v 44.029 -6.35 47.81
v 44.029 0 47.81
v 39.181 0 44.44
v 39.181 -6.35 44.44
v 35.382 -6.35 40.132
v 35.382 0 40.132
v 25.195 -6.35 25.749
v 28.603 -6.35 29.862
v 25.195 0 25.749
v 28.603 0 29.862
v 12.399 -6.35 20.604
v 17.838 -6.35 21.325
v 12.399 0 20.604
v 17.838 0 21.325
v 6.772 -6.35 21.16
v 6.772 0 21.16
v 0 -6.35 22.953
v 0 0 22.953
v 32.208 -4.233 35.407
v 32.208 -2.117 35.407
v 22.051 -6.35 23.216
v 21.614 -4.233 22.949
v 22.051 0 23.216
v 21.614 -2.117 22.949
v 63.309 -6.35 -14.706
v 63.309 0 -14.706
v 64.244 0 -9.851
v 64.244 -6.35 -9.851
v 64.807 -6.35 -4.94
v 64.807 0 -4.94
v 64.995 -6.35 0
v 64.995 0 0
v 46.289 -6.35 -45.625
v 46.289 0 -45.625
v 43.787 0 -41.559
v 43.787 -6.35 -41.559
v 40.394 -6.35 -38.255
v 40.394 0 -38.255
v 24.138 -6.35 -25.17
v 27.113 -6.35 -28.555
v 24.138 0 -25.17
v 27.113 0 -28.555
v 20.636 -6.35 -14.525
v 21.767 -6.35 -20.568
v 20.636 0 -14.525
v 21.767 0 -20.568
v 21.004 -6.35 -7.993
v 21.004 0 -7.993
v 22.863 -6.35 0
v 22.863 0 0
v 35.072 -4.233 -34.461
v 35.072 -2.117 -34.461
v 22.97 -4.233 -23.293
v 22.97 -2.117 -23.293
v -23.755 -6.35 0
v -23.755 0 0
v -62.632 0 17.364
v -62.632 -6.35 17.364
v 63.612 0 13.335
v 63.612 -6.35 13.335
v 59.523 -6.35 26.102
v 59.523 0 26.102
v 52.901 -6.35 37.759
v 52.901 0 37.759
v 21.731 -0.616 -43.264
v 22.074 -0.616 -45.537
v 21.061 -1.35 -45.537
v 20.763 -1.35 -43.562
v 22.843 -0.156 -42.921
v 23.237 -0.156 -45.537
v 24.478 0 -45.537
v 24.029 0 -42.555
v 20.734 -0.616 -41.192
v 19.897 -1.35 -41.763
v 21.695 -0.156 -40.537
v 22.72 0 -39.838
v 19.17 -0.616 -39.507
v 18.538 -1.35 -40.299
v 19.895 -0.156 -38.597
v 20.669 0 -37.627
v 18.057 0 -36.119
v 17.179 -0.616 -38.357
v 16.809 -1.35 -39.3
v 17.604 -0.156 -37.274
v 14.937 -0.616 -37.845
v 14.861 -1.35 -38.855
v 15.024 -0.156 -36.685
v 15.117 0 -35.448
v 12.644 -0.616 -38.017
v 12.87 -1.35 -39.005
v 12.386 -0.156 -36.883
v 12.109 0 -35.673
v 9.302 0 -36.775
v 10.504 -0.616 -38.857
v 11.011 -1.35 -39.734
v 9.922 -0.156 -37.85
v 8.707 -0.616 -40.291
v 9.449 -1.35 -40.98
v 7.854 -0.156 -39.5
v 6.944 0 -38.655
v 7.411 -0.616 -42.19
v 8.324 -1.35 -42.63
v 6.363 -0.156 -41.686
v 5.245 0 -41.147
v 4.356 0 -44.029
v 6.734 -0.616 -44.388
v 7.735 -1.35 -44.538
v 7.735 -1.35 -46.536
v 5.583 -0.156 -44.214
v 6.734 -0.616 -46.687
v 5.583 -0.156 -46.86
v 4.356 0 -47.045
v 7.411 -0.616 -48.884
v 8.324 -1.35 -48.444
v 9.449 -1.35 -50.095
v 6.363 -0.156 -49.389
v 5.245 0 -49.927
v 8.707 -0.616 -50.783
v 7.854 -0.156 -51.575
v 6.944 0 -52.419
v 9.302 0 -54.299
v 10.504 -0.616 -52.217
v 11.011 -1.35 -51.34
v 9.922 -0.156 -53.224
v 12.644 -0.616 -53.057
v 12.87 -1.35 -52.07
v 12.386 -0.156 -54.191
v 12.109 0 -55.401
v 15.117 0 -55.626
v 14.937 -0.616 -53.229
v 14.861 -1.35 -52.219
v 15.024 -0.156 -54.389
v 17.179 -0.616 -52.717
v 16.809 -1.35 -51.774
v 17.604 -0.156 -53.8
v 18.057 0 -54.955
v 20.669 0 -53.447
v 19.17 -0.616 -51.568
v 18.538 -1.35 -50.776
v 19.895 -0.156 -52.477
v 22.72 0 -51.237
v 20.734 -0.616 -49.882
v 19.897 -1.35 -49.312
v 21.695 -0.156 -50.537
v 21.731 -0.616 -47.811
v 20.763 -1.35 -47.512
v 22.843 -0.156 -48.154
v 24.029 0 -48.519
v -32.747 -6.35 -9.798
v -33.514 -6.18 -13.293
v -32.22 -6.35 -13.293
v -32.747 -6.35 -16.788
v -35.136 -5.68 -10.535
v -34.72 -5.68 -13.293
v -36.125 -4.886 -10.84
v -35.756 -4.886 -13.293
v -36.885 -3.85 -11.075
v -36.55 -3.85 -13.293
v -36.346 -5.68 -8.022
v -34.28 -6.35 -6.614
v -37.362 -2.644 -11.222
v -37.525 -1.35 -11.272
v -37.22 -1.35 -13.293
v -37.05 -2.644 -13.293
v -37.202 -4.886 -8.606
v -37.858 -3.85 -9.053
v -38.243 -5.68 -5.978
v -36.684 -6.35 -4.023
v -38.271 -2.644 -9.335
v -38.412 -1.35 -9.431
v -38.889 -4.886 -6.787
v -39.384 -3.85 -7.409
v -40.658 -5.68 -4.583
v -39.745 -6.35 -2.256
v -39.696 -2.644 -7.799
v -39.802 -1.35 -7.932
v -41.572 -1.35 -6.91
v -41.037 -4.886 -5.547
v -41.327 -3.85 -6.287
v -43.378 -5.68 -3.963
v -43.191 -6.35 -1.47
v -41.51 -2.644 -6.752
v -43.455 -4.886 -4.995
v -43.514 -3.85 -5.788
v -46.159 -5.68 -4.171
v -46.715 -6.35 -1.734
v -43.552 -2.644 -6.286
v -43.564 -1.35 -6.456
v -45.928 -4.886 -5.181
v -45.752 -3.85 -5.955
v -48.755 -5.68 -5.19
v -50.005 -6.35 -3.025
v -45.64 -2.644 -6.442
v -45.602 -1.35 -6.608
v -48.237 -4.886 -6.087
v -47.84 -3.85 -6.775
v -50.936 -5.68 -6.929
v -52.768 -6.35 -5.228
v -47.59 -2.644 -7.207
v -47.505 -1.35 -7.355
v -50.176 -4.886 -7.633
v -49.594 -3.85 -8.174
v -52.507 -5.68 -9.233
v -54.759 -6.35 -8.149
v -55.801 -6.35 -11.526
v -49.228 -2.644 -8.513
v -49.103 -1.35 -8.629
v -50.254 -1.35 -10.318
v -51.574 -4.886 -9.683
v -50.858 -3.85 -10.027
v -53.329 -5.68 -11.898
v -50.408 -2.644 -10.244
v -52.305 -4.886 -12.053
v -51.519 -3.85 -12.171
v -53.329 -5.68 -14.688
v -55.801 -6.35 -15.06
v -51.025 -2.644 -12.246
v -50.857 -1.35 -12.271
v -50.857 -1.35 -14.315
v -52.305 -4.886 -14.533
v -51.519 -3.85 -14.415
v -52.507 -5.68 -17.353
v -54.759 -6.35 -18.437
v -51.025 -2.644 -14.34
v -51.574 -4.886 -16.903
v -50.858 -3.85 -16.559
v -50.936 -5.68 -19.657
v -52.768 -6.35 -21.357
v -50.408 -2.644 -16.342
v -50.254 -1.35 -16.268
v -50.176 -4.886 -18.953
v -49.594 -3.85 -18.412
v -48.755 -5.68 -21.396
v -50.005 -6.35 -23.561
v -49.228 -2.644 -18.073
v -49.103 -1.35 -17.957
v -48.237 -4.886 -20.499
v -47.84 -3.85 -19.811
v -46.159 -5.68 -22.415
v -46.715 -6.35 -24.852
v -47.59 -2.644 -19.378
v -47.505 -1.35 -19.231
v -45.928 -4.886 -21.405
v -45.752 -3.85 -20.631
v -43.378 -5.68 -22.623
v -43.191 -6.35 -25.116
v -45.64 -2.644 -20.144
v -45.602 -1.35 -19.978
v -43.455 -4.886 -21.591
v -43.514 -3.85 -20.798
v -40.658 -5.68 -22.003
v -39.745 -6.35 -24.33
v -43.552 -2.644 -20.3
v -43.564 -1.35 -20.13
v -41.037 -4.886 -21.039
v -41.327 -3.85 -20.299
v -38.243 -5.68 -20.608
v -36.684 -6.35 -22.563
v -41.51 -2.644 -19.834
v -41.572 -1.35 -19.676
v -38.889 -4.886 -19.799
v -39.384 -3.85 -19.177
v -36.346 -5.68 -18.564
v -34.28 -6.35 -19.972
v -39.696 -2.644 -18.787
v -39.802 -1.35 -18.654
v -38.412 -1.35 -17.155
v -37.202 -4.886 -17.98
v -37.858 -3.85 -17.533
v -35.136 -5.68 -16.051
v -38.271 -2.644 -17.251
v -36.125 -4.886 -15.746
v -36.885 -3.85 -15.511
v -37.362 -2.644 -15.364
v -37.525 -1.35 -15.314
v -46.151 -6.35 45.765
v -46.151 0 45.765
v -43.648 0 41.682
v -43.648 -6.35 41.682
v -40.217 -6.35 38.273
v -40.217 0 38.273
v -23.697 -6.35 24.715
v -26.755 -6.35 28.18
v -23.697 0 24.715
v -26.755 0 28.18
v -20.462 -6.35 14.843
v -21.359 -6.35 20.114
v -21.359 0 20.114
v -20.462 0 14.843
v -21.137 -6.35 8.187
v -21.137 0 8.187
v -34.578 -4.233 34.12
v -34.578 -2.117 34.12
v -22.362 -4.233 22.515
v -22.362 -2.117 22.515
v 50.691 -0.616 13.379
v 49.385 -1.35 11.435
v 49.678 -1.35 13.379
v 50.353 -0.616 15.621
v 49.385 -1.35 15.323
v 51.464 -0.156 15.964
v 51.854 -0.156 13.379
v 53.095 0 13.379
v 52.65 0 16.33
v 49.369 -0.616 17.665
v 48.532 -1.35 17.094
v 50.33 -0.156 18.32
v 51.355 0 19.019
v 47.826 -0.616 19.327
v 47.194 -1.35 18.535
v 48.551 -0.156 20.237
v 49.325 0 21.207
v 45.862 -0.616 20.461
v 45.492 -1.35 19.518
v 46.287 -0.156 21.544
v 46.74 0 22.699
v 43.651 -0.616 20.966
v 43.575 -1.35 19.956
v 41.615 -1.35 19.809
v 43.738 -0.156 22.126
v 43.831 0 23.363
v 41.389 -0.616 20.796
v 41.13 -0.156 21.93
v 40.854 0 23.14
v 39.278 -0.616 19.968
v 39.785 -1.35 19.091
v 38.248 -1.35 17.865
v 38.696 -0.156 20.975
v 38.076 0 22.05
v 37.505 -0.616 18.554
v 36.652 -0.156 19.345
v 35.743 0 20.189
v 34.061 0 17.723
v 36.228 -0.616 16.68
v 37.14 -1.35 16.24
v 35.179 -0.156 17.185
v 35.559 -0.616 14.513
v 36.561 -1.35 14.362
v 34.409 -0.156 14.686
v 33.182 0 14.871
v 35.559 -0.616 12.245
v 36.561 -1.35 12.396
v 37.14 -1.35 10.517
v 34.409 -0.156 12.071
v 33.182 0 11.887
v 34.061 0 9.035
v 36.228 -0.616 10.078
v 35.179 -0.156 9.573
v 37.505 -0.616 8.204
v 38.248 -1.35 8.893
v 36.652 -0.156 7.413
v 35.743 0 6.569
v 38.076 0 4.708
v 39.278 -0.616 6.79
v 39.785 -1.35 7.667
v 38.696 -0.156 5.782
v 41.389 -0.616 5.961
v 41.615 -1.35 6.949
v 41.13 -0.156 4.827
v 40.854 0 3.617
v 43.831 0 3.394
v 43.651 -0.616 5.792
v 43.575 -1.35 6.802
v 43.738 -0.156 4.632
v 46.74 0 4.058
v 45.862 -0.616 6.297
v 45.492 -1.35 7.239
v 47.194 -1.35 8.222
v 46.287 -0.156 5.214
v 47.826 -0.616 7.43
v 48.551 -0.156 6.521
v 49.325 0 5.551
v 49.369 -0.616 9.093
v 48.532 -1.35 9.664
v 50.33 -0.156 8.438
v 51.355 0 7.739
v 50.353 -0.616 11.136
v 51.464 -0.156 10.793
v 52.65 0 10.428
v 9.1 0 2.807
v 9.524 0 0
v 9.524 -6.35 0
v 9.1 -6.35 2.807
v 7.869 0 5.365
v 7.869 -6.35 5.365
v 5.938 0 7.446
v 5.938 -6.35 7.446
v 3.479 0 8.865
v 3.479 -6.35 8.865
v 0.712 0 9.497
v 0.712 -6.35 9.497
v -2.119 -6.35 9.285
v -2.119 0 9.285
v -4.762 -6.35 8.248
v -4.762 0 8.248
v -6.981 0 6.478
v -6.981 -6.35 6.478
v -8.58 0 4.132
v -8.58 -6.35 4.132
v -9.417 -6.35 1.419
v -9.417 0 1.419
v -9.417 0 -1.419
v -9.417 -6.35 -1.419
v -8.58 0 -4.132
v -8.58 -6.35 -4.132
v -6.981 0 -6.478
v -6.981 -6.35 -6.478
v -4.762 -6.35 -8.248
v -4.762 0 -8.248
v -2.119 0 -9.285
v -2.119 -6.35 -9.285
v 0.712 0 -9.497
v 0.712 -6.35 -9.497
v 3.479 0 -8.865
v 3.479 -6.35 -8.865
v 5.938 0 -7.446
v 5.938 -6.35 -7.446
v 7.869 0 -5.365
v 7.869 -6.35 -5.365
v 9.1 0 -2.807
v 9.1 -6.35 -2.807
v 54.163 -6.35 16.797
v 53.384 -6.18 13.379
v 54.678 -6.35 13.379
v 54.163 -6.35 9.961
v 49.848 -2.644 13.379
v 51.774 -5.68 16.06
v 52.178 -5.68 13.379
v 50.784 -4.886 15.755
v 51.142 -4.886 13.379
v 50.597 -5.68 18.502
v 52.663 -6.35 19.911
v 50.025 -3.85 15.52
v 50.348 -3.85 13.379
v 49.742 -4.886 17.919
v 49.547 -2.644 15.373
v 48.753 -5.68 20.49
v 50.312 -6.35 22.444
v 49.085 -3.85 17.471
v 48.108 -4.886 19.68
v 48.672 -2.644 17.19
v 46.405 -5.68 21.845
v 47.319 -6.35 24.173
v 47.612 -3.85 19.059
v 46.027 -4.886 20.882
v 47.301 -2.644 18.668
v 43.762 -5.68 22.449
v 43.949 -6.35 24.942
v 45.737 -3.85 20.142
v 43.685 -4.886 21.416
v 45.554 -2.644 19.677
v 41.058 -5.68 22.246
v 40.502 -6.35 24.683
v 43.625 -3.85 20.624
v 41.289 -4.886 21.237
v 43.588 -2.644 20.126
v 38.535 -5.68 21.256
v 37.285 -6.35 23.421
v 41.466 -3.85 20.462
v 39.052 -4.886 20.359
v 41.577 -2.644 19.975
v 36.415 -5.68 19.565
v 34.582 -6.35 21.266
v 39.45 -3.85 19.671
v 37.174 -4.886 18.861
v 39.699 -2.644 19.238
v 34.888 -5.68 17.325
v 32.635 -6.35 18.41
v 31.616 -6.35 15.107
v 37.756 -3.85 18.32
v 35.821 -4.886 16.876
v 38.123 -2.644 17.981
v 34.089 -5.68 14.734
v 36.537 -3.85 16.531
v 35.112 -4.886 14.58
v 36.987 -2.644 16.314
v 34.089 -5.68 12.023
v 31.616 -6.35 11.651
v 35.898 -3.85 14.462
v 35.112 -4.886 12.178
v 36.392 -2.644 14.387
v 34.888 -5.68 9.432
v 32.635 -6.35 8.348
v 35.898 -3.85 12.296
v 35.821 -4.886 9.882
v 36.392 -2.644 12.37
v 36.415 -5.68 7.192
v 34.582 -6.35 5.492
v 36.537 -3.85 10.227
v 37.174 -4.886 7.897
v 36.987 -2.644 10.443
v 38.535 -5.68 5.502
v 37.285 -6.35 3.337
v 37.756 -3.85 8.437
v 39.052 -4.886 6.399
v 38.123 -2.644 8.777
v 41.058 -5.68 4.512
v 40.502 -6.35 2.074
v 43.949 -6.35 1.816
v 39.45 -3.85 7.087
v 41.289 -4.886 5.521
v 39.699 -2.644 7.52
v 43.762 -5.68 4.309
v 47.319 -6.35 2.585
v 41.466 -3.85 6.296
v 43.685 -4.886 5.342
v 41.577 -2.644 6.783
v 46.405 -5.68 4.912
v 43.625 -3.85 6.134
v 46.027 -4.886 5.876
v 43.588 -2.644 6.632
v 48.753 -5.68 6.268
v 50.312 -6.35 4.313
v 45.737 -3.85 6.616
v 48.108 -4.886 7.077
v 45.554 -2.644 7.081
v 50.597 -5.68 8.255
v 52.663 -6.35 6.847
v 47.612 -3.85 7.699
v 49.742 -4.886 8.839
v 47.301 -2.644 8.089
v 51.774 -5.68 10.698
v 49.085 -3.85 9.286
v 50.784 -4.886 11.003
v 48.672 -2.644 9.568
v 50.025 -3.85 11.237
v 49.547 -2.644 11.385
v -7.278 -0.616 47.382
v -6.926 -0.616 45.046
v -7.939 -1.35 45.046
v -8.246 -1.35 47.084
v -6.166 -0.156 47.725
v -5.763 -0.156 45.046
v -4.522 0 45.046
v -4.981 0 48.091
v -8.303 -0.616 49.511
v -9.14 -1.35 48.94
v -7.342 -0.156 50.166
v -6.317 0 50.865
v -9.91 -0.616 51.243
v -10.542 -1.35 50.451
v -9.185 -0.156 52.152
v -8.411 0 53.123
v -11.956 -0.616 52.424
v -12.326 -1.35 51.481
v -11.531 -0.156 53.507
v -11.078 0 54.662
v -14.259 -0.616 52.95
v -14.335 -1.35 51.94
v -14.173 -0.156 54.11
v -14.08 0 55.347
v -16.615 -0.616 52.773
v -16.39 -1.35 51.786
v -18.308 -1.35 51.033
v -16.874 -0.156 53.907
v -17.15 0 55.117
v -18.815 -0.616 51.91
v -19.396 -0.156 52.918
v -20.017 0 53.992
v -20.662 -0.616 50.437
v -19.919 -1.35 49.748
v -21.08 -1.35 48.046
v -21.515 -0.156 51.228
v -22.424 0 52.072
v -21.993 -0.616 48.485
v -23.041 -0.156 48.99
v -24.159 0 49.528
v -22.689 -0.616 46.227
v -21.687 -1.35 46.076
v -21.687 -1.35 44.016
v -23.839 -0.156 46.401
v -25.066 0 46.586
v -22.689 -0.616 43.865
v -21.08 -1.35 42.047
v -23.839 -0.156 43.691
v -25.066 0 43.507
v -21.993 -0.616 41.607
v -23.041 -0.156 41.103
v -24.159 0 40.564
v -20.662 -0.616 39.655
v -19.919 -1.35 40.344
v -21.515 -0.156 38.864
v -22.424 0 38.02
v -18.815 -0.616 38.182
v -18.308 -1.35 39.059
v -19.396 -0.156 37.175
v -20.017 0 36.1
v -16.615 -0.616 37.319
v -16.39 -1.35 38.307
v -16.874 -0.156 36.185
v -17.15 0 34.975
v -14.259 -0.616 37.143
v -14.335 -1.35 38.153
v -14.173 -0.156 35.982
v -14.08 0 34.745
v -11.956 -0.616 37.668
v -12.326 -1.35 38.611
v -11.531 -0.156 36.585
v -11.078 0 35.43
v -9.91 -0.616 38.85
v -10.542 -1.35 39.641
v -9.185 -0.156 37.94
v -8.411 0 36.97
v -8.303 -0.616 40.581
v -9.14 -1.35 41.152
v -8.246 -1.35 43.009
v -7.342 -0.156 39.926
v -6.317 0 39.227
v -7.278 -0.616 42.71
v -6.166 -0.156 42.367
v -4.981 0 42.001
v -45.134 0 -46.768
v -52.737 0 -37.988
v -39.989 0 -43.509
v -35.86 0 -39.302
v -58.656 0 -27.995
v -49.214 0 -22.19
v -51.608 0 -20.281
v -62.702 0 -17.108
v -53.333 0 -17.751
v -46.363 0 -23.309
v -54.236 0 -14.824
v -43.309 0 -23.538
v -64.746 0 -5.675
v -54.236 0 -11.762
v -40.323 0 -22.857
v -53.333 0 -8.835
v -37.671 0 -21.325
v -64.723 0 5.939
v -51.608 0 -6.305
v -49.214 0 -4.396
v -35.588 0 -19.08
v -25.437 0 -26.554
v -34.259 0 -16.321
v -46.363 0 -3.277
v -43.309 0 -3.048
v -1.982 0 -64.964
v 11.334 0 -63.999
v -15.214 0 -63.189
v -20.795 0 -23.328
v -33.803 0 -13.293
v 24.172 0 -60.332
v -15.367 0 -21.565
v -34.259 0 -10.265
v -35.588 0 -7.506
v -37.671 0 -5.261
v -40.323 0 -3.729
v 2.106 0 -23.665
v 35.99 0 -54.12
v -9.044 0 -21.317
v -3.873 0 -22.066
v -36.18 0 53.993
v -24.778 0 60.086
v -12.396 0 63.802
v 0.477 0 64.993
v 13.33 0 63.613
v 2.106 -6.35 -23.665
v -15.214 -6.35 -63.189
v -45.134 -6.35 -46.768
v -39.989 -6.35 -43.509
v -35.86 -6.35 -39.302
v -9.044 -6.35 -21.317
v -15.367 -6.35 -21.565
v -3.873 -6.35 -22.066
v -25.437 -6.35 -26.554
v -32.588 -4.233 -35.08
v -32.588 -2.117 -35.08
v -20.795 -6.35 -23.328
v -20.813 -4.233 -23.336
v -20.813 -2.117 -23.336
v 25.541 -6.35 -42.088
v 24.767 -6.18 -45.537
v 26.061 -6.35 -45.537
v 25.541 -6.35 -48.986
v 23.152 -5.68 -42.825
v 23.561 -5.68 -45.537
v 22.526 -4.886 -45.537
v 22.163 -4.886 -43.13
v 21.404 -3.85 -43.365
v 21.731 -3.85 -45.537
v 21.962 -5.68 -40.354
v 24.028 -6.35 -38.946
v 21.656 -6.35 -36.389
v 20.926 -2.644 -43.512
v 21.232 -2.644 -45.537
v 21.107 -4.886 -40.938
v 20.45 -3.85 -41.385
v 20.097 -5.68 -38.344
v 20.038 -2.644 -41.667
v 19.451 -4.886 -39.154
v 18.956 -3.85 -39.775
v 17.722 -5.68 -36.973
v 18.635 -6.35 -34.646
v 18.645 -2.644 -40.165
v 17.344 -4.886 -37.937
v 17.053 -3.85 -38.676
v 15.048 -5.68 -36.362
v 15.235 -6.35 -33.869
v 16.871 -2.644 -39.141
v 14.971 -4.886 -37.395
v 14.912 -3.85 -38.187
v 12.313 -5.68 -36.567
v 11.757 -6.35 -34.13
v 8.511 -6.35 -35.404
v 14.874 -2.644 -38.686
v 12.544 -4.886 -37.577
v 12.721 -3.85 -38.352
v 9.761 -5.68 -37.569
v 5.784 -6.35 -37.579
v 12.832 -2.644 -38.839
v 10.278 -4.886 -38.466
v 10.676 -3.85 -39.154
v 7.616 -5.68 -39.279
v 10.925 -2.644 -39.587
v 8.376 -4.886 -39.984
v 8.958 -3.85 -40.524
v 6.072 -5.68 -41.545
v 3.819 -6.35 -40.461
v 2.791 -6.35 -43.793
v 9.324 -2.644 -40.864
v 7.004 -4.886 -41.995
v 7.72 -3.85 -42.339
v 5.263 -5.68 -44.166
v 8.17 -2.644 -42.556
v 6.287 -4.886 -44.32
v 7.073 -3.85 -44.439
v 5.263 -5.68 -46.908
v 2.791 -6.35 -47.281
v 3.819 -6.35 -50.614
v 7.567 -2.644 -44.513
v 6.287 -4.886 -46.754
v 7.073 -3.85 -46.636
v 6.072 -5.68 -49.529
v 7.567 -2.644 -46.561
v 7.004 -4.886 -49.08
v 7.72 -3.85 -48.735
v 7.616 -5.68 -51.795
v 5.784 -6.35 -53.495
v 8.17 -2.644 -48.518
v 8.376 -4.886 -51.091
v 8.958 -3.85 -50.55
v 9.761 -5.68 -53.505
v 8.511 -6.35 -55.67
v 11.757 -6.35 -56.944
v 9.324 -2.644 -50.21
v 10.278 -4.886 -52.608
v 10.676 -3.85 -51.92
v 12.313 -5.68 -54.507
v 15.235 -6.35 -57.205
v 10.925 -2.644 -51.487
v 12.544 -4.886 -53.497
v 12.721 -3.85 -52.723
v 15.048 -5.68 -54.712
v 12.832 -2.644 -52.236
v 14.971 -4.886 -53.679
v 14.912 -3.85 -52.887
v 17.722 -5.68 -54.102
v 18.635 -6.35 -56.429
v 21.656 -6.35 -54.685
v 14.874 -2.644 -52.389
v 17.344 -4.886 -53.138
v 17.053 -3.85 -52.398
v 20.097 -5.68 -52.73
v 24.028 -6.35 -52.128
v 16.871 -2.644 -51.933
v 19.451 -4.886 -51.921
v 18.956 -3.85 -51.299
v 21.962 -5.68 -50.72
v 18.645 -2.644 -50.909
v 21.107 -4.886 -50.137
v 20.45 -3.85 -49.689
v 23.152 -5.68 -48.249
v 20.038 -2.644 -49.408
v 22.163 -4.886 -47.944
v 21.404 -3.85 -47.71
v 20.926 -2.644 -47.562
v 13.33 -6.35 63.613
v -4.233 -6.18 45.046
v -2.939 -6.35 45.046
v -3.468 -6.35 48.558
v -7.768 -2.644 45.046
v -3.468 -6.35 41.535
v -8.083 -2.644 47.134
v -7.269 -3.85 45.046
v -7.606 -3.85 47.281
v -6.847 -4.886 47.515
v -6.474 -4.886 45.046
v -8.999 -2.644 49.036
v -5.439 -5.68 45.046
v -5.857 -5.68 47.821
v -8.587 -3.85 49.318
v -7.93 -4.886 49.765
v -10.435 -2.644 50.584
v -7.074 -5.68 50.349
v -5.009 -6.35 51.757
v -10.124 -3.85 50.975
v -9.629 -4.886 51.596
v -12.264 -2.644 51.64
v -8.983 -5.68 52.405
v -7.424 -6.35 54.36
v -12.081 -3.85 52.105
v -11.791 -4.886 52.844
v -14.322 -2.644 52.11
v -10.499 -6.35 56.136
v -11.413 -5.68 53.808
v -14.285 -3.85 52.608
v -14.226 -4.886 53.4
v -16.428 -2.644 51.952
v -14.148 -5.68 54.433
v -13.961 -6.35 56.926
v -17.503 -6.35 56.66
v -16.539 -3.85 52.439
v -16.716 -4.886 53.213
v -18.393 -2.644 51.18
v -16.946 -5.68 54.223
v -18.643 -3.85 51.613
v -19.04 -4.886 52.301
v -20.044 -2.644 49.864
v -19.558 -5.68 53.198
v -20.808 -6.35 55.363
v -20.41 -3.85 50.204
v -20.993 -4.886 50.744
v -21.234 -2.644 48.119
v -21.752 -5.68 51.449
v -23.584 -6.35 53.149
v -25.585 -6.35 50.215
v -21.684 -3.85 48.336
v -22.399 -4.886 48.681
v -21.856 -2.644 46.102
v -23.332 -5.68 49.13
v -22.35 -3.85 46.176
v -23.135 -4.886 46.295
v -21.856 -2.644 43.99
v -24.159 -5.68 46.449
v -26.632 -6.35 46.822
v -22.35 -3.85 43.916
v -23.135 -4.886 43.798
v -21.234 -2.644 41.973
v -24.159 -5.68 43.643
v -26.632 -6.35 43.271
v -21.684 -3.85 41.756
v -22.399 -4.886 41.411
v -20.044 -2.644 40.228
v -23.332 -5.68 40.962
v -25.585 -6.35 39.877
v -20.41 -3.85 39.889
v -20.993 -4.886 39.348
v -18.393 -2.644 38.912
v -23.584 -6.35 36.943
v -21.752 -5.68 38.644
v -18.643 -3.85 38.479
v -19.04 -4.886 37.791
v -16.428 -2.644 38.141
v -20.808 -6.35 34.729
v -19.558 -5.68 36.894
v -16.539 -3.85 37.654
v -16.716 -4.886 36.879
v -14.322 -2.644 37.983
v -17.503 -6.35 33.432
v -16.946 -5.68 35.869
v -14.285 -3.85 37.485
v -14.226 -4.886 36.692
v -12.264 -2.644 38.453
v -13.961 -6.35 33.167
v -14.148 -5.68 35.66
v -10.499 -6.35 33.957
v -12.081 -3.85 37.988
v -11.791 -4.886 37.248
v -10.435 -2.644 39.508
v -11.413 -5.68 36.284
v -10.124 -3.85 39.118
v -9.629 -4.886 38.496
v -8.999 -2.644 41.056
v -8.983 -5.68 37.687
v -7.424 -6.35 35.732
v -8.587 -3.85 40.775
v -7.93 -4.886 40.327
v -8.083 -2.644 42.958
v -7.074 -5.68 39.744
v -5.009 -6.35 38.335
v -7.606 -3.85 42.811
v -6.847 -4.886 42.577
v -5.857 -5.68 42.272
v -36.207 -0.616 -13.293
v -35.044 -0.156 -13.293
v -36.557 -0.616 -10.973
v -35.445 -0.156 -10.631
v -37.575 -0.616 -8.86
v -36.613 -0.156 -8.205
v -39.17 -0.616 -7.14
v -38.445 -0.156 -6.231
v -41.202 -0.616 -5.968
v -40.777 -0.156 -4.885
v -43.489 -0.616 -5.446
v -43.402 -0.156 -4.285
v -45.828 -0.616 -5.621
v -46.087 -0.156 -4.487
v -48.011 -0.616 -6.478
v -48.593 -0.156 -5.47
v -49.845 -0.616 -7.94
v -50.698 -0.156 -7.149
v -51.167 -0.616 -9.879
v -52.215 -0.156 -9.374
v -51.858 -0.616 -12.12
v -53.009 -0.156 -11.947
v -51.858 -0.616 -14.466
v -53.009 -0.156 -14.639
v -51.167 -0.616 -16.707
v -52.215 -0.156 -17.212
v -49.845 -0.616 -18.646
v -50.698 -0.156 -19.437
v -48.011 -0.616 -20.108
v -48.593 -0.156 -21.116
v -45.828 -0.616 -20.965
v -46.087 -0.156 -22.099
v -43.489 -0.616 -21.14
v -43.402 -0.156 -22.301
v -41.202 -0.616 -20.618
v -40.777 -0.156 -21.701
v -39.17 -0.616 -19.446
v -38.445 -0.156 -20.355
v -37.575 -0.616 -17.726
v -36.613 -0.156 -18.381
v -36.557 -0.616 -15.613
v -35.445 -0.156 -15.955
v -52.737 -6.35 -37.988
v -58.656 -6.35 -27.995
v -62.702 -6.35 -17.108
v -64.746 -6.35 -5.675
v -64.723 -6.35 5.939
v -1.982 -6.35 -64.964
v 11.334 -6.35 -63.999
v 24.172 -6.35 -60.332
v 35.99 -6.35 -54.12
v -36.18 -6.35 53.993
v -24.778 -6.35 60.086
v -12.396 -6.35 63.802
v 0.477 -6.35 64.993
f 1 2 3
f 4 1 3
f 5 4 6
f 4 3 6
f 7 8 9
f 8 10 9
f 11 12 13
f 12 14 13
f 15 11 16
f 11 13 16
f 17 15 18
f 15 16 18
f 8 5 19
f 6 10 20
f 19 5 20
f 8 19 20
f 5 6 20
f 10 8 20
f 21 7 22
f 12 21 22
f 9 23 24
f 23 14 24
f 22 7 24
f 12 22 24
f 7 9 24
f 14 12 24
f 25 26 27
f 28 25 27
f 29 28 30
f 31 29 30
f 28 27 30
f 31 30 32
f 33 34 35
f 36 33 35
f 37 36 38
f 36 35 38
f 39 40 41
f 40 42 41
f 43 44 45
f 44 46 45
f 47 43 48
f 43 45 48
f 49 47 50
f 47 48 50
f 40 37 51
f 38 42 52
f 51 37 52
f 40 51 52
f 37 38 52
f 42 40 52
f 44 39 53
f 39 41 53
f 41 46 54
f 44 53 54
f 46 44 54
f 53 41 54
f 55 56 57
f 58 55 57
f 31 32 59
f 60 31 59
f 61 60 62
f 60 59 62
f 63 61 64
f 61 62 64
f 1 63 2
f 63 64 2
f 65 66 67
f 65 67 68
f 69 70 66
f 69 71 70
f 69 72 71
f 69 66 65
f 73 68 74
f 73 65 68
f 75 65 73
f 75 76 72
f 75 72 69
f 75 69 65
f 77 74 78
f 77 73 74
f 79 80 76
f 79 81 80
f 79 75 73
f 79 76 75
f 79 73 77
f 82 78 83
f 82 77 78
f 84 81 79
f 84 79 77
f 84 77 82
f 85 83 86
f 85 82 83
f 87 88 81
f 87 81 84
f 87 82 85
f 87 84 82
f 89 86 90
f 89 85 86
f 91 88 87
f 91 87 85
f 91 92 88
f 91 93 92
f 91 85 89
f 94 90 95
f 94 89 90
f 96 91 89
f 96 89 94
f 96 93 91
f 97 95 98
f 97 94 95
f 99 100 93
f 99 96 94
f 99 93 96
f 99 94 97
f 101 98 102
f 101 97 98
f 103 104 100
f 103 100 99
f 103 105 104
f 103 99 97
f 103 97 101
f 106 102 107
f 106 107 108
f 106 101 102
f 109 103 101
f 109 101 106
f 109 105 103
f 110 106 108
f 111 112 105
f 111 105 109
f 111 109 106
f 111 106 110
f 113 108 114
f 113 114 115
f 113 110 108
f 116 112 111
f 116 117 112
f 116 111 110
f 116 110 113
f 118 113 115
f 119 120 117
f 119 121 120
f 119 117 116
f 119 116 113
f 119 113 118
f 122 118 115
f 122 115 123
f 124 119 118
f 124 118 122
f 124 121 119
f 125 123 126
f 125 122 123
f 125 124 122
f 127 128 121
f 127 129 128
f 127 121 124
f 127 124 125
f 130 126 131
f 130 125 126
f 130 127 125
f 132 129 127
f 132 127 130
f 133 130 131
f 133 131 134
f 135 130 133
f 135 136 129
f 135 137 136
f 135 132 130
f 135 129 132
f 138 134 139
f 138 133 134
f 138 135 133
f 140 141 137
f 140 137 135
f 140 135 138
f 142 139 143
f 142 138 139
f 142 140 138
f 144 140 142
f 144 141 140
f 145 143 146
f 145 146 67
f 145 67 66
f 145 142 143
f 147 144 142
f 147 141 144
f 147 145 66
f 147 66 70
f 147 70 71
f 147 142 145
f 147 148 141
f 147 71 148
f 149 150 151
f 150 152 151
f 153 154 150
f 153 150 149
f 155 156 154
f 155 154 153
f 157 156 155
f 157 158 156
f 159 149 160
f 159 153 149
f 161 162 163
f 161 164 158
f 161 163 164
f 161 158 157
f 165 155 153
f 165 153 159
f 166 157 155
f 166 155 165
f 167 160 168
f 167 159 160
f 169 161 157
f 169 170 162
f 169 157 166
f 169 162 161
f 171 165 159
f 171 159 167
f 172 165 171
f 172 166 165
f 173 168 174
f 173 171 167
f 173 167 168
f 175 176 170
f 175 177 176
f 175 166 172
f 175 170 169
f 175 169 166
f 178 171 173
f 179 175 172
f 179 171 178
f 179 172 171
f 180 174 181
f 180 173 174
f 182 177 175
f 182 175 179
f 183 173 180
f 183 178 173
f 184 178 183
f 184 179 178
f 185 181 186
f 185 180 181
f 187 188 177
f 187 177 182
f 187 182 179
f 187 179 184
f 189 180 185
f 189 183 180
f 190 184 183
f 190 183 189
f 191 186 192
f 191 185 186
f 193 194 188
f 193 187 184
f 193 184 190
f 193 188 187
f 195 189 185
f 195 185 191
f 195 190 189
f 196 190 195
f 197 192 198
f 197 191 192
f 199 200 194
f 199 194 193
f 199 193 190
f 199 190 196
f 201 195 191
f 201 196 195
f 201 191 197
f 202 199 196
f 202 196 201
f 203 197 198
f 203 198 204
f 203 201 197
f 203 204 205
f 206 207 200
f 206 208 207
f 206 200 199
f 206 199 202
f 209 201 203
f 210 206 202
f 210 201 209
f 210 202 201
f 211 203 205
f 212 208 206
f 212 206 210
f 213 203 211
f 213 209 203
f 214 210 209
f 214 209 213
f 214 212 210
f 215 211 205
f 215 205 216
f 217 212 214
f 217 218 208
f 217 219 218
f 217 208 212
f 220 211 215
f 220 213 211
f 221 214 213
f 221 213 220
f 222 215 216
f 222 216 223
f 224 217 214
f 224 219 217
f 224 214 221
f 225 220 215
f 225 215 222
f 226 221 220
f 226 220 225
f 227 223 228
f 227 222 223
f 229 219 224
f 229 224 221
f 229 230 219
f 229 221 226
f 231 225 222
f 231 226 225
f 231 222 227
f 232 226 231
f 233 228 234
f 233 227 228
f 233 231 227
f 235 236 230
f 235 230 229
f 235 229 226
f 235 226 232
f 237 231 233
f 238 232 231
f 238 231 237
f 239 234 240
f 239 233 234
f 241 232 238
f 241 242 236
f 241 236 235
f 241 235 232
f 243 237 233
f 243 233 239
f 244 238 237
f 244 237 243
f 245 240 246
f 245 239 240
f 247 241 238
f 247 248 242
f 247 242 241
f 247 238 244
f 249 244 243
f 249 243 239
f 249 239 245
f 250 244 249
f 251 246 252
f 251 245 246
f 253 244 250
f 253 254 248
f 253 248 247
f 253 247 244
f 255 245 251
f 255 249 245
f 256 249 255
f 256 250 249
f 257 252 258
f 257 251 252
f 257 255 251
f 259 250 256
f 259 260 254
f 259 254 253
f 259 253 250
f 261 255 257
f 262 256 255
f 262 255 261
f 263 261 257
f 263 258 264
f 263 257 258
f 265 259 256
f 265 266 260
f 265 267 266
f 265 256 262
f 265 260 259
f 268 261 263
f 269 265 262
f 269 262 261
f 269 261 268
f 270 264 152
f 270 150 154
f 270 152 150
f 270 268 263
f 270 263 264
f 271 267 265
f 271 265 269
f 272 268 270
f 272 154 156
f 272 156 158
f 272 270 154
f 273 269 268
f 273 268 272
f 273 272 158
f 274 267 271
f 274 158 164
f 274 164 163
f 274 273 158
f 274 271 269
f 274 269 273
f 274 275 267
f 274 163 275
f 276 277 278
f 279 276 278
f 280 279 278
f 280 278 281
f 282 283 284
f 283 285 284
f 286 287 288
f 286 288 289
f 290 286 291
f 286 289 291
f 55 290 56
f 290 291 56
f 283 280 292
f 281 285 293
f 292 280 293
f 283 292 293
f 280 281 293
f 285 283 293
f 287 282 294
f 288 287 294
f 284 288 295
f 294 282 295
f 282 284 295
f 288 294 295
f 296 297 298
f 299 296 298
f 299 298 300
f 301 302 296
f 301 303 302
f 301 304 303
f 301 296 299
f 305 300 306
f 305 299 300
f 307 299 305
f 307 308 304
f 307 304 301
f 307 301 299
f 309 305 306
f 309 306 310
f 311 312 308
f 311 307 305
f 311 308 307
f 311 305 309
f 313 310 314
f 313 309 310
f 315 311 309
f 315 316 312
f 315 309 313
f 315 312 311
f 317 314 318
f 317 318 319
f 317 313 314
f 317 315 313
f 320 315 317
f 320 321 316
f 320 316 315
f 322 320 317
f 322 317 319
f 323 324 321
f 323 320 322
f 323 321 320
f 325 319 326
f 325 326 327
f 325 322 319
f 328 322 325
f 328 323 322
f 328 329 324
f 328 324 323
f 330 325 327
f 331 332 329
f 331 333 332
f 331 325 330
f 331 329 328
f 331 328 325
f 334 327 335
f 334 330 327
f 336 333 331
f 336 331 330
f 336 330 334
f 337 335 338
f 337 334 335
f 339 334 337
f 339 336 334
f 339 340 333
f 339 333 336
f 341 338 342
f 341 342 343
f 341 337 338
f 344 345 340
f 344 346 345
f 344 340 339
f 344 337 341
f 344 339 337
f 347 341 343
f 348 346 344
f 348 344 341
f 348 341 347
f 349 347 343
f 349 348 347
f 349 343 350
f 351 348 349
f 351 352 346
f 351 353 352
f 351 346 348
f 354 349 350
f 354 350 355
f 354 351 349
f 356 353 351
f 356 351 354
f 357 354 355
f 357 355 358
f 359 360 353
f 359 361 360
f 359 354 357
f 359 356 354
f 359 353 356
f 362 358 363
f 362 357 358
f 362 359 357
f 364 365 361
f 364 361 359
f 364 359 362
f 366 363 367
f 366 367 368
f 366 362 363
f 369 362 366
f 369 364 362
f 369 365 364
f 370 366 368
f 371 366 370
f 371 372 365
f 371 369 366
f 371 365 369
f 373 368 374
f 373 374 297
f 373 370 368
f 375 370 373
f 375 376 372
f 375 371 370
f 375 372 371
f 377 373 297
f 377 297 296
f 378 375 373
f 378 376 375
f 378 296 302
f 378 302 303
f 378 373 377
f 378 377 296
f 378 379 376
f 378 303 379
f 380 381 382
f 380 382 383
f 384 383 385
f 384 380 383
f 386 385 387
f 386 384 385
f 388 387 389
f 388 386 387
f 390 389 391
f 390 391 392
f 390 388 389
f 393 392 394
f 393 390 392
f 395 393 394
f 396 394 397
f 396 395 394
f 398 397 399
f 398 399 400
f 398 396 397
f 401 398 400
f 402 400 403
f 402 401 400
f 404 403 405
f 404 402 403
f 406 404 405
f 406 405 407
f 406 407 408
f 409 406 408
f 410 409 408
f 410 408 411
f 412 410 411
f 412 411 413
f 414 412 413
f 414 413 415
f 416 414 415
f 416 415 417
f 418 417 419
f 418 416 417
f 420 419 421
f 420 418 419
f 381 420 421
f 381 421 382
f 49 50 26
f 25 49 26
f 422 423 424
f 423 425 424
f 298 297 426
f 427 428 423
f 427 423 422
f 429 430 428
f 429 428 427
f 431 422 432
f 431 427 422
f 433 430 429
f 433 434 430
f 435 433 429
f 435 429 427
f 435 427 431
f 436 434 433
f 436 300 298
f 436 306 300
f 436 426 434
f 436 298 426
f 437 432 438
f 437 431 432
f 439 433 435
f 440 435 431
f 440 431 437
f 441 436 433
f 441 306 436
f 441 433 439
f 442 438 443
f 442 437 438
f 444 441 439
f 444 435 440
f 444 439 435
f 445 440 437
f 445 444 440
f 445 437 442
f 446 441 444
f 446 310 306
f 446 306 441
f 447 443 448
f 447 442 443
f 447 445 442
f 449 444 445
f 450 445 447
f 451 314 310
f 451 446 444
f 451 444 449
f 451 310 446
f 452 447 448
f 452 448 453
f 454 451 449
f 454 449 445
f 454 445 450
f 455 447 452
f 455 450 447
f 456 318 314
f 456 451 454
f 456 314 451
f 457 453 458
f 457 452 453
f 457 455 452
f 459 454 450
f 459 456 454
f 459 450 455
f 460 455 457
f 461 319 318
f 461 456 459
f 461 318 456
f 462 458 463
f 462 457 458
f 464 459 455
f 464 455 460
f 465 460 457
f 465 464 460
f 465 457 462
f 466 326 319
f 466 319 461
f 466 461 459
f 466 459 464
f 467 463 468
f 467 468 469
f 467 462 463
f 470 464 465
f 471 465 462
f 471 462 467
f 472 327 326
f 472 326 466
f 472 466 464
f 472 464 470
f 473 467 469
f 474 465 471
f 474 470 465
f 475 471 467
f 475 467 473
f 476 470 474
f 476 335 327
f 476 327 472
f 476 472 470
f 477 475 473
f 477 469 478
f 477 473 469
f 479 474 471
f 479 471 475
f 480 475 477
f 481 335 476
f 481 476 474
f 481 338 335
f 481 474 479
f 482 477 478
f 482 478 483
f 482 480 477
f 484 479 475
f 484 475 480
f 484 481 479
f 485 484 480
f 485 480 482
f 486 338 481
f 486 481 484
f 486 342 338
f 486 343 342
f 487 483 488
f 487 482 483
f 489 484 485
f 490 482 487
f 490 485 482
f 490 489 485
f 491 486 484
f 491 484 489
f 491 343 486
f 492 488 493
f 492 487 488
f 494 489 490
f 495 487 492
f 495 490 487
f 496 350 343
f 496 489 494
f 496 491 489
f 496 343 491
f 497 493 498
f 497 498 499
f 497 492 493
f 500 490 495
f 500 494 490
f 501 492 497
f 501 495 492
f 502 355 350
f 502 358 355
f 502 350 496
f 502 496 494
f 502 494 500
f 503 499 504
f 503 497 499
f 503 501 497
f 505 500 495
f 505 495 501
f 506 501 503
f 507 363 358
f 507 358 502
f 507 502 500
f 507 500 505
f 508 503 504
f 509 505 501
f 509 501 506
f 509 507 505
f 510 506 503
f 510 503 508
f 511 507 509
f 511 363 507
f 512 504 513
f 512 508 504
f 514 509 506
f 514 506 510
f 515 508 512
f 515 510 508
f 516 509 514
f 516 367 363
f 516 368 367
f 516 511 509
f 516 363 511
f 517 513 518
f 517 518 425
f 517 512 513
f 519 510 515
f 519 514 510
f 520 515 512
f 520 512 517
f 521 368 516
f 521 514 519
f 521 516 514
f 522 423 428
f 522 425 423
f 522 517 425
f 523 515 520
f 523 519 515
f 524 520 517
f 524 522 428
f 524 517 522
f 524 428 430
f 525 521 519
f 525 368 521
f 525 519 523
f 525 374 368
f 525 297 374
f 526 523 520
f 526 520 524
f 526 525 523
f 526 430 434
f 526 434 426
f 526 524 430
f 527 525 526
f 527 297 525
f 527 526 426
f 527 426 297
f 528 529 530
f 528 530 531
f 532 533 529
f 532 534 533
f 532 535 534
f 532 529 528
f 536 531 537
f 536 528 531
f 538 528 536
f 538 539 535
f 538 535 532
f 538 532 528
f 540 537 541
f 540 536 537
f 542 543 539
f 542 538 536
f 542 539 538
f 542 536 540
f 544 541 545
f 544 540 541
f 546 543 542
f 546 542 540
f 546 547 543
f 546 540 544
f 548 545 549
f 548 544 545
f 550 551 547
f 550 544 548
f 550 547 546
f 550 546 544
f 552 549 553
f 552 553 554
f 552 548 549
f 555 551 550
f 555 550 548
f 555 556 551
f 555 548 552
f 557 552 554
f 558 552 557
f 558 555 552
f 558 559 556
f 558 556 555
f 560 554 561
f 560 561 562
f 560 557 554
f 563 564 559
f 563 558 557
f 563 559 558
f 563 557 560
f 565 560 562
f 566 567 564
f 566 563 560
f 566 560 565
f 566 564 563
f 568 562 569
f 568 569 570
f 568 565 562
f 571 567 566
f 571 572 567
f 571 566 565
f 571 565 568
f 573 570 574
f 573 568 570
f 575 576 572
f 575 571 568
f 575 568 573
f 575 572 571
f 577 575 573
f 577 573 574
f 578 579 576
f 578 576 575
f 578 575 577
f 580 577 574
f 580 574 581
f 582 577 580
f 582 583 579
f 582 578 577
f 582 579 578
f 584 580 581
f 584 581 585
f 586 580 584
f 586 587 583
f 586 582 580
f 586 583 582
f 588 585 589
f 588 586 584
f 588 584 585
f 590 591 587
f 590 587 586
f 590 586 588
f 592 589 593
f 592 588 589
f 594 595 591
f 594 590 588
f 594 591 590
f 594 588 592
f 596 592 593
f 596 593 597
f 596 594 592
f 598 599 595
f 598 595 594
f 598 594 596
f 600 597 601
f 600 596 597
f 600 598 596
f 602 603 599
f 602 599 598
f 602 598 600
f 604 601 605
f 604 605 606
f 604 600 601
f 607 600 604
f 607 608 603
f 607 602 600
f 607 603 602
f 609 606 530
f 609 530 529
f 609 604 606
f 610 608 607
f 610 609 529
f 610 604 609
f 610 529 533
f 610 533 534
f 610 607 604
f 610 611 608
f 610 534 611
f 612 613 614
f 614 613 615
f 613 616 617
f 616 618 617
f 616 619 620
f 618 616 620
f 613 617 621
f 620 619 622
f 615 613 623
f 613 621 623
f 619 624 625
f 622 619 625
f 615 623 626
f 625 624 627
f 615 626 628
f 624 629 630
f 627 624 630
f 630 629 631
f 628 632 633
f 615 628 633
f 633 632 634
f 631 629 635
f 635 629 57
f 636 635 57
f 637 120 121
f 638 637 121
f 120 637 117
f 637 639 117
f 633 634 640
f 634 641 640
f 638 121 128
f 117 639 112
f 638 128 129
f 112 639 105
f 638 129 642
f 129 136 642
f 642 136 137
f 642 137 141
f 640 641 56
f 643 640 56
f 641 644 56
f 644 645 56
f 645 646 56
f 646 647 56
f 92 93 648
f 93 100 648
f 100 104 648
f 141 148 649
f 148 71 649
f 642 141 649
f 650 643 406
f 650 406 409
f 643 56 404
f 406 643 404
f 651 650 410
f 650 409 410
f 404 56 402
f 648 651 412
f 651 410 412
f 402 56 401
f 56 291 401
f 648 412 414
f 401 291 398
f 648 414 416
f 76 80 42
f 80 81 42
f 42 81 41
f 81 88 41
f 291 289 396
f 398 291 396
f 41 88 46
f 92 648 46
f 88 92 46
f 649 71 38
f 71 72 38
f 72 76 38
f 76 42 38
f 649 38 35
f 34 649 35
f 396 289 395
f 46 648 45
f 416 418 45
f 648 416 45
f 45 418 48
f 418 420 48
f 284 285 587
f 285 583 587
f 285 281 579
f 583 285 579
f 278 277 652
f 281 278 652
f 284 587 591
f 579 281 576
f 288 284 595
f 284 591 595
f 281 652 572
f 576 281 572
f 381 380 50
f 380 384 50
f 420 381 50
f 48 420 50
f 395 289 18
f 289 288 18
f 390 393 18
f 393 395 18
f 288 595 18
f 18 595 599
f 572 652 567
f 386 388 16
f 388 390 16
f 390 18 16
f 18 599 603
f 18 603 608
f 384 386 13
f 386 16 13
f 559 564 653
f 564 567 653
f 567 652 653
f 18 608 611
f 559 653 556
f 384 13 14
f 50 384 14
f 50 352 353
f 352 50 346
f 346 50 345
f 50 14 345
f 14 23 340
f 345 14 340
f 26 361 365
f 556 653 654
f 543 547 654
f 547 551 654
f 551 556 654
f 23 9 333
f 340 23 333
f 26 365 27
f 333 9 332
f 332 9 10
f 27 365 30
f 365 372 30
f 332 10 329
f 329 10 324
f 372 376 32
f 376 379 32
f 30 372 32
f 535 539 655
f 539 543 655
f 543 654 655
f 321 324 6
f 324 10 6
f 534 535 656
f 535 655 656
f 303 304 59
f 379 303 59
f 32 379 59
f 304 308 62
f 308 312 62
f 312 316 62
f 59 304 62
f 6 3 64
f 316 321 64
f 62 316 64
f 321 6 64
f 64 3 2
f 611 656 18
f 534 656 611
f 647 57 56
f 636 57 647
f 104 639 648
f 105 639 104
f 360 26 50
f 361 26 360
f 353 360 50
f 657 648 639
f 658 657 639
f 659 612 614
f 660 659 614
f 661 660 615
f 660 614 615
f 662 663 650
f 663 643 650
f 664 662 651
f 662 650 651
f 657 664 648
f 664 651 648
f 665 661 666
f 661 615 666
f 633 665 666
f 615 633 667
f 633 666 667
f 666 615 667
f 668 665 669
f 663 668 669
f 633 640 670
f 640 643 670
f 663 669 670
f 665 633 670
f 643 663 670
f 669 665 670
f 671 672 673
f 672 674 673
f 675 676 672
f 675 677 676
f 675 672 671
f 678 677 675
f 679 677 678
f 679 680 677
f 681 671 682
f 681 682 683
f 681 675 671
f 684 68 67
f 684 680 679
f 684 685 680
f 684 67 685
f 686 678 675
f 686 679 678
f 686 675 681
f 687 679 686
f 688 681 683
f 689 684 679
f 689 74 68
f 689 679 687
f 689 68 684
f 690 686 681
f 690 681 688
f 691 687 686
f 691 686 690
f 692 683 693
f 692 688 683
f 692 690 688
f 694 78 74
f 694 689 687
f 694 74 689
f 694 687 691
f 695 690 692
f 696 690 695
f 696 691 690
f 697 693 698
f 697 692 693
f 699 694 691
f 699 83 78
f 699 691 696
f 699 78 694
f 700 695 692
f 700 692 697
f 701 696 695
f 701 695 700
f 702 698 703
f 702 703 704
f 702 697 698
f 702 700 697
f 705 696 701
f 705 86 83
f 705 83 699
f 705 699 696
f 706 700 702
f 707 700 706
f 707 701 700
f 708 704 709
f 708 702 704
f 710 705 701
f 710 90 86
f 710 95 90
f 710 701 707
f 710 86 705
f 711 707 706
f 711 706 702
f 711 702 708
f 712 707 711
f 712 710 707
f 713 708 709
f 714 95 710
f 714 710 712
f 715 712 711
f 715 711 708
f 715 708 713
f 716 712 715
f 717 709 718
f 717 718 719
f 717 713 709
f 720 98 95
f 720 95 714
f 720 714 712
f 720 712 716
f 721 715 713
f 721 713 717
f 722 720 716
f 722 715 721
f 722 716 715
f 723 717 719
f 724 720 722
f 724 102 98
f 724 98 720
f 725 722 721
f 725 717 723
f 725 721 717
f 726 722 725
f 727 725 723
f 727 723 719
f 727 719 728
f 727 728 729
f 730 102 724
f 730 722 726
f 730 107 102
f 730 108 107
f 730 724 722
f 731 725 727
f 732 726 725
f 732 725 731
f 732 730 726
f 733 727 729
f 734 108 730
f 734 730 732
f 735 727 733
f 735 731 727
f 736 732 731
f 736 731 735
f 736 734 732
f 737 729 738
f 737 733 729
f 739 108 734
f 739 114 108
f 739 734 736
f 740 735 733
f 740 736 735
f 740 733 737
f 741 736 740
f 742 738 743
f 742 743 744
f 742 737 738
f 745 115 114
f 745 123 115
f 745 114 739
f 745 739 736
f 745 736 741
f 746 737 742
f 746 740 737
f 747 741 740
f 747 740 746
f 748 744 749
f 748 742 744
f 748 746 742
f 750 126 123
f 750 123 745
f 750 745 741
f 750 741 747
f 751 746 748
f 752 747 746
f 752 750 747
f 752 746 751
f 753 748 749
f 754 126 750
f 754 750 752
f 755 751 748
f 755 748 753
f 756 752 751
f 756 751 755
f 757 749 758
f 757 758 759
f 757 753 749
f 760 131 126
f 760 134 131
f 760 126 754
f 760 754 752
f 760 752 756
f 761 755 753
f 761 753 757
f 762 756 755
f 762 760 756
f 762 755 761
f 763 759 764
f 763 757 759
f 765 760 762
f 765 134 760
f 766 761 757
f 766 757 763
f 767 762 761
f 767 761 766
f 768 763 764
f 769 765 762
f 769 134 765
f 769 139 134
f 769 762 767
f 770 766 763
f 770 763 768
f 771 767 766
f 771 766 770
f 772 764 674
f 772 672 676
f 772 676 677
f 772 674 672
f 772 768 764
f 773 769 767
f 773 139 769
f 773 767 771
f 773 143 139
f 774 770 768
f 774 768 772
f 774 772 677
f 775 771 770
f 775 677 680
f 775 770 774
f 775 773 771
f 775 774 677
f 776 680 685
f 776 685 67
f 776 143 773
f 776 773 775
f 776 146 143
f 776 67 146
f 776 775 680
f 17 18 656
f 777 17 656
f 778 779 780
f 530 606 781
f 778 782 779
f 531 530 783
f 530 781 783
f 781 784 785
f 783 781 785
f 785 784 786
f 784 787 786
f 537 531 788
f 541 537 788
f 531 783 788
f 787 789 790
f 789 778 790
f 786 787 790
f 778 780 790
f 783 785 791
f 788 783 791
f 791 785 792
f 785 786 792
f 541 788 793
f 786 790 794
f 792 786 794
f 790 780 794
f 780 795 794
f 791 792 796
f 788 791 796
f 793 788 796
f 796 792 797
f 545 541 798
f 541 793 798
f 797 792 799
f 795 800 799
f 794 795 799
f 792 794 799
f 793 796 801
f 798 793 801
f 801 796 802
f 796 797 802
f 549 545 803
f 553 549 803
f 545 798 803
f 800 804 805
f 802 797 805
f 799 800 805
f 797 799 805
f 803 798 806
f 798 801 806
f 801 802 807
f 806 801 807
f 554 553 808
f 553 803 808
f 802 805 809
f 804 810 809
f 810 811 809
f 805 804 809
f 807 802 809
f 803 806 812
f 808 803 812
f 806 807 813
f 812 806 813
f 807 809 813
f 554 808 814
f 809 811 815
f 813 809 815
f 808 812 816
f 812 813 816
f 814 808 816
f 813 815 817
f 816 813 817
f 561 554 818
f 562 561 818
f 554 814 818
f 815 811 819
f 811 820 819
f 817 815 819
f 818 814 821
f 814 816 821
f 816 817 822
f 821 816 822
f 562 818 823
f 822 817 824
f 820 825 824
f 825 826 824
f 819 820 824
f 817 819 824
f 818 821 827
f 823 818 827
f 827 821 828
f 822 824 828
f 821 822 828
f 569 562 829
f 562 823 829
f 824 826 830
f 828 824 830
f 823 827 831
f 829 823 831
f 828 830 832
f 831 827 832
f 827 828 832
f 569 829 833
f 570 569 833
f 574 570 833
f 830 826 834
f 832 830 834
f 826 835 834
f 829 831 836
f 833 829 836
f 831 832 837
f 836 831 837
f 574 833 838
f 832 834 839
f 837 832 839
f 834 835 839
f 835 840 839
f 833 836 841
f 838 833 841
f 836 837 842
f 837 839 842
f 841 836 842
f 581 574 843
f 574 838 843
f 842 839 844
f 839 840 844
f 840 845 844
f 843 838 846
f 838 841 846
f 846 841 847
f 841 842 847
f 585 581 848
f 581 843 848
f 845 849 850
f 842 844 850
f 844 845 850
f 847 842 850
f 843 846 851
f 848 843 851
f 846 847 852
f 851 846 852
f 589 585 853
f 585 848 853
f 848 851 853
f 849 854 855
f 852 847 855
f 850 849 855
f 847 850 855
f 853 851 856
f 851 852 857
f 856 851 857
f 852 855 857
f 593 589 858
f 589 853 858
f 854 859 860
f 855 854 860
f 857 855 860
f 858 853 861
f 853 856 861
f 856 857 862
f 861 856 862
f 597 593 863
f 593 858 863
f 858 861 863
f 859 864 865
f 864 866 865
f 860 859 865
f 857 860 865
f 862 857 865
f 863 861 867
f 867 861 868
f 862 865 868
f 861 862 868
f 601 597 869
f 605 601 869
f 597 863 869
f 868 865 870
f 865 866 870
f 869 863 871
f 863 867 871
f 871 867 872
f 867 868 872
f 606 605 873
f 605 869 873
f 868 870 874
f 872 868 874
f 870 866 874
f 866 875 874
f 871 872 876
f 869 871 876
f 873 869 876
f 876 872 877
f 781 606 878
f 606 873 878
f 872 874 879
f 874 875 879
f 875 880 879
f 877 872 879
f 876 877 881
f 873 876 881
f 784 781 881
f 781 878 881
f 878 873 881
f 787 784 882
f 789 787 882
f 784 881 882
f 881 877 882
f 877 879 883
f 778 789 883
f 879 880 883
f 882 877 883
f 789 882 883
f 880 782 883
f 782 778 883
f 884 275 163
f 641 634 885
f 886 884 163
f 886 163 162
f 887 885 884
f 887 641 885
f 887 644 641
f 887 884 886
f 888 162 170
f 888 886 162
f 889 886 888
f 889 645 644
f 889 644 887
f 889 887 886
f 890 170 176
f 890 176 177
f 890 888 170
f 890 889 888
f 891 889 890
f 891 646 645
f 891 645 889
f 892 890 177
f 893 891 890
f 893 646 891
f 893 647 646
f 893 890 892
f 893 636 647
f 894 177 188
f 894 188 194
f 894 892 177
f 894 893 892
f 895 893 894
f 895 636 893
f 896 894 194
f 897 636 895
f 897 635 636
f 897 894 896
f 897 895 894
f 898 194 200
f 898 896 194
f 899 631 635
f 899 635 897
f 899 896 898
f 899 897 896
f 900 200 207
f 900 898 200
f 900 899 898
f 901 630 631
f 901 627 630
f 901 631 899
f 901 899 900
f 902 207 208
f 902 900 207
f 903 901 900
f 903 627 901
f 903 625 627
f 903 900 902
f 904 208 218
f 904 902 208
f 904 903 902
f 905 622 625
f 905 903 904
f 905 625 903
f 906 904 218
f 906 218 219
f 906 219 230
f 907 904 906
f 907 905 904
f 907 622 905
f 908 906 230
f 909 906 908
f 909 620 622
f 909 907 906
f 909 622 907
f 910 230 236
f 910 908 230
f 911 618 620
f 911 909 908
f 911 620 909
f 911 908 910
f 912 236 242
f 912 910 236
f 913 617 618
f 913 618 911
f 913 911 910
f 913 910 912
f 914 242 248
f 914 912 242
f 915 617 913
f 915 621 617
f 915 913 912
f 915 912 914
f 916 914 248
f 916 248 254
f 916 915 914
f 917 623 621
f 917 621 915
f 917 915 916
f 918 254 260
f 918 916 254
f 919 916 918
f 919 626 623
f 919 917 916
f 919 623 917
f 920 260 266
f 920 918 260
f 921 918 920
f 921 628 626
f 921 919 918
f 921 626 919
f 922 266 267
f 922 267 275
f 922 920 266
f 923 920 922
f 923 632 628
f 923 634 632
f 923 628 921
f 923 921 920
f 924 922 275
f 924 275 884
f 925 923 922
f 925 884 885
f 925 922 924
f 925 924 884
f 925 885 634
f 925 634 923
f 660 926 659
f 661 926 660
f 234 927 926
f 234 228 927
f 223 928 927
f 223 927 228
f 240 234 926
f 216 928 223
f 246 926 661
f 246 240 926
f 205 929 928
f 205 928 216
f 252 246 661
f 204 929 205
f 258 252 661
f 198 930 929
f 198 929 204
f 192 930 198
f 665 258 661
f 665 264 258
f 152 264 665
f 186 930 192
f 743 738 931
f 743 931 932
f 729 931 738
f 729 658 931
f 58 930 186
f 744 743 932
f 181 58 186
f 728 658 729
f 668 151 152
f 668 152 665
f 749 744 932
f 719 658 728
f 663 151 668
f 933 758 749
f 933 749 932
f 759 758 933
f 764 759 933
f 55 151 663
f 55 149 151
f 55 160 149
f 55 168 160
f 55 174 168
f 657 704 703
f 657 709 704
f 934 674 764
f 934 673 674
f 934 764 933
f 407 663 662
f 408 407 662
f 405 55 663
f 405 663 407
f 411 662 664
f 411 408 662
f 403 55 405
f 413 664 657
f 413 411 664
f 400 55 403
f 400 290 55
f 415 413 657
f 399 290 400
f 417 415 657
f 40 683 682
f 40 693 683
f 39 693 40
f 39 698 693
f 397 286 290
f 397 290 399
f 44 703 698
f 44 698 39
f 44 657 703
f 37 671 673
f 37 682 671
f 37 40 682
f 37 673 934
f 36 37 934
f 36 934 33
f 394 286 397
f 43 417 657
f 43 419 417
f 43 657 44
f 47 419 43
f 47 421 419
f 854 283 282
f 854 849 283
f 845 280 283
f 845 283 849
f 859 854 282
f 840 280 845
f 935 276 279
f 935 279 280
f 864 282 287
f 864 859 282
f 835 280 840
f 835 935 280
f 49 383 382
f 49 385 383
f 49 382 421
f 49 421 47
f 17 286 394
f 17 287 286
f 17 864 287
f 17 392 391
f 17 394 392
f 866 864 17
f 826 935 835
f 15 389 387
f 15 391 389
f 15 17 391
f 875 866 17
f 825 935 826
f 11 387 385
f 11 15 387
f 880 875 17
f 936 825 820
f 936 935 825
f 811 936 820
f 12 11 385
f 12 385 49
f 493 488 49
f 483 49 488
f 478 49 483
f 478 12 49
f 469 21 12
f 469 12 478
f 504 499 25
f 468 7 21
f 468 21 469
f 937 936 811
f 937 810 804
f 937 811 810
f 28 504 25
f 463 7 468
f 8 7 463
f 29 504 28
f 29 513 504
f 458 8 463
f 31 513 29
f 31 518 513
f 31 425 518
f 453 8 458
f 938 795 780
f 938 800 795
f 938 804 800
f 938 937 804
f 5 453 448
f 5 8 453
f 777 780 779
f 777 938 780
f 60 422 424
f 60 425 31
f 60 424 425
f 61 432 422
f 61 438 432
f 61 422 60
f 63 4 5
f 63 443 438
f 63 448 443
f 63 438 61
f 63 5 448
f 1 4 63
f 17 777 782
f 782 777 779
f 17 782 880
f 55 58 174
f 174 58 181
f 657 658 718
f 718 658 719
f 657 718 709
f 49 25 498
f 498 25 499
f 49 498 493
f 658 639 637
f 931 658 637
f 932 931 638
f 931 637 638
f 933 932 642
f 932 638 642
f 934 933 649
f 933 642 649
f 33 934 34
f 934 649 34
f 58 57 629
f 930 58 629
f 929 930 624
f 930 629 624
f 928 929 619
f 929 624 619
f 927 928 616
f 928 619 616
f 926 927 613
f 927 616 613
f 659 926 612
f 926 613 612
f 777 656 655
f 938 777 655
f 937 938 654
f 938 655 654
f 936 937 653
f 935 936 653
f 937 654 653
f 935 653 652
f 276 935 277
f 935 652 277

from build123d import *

# Parameters (mm, degrees)
F0_R     = 12.5871716163
F0_R_2   = 12.1953483152
F0_R_3   = 12.6822409032
F0_R_4   = 19.9906816782
F0_R_5   = 12.6370181024
F0_R_6   = 9.5235294205
F0_R_7   = 6.7003849176
F0_R_8   = 6.5953683563
F0_R_9   = 6.9128696082
F0_R_10  = 6.8565575186
F1_DEPTH = 6.35
F2_R     = 5
F4_R     = 5
F6_R     = 5
F8_R     = 5


# Not quite as in the source:
# - a fillet or chamfer that OpenCascade refuses, or shapes differently, is made with other operations: its cross-section is extruded or revolved along the edge and cut away or added


with BuildPart() as f1:
    # F0 (on Front) → F1 (new body)
    with BuildSketch(Plane.XZ):
        with BuildLine():
            ThreePointArc((63.3090875557, -14.7056564815), (64.571840502, -7.4009670899), (64.994591311, 0))
            ThreePointArc((64.994591311, 0), (59.5228001423, 26.1023593361), (44.0287494104, 47.8096865189))
            add(Edge.make_bspline(
                [(44.0287494104, 47.8096865189), (27.5113759255, 39.6058435289), (31.2073216603, 12.5460234383), (0, 22.9526739568)],
                knots=[0, 0, 0, 0, 50.5608726998, 50.5608726998, 50.5608726998, 50.5608726998], degree=3))
            Line((0, 22.9526739568), (13.3303934836, 63.6128721978))
            ThreePointArc((13.3303934836, 63.6128721978), (-18.6797347685, 62.2524249219), (-46.1507096662, 45.7647123556))
            add(Edge.make_bspline(
                [(-46.1507096662, 45.7647123556), (-39.6496795631, 30.4512329053), (-10.8062981221, 31.6188670695), (-23.7553194165, 0)],
                knots=[0, 0, 0, 0, 50.9505878418, 50.9505878418, 50.9505878418, 50.9505878418], degree=3))
            Line((-23.7553194165, 0), (-62.6320905617, 17.3642774556))
            ThreePointArc((-62.6320905617, 17.3642774556), (-62.7024955301, -17.1083007333), (-45.133666011, -46.7680349394))
            add(Edge.make_bspline(
                [(-45.133666011, -46.7680349394), (-28.2305709499, -39.1496551166), (-30.3561454639, -13.2581368089), (2.106344793, -23.6651096493)],
                knots=[0, 0, 0, 0, 52.5867262502, 52.5867262502, 52.5867262502, 52.5867262502], degree=3))
            Line((2.106344793, -23.6651096493), (-15.2139644468, -63.1888612454))
            ThreePointArc((-15.2139644468, -63.1888612454), (17.847761713, -62.4960342863), (46.2891786164, -45.6246516995))
            add(Edge.make_bspline(
                [(46.2891786164, -45.6246516995), (39.8087657789, -30.4243322673), (12.678748928, -33.3952058572), (22.8630993515, 0)],
                knots=[0, 0, 0, 0, 51.2873281857, 51.2873281857, 51.2873281857, 51.2873281857], degree=3))
            Line((22.8630993515, 0), (63.3090875557, -14.7056564815))
        make_face()
        with Locations((-44.0767258406, -13.292982243)):
            Circle(F0_R, mode=Mode.SUBTRACT)
        with Locations((14.3607640639, -45.5371253192)):
            Circle(F0_R_2, mode=Mode.SUBTRACT)
        with Locations((-14.8517312482, 45.0461581349)):
            Circle(F0_R_3, mode=Mode.SUBTRACT)
        Circle(F0_R_4, mode=Mode.SUBTRACT)
        with Locations((43.082293123, 13.3788315579)):
            Circle(F0_R_5, mode=Mode.SUBTRACT)
        Circle(F0_R_4)
        Circle(F0_R_6, mode=Mode.SUBTRACT)
        with Locations((14.3607640639, -45.5371253192)):
            Circle(F0_R_2)
        with Locations((14.3607640639, -45.5371253192)):
            Circle(F0_R_7, mode=Mode.SUBTRACT)
        with Locations((43.082293123, 13.3788315579)):
            Circle(F0_R_5)
        with Locations((43.082293123, 13.3788315579)):
            Circle(F0_R_8, mode=Mode.SUBTRACT)
        with Locations((-14.8517312482, 45.0461581349)):
            Circle(F0_R_3)
        with Locations((-14.8517312482, 45.0461581349)):
            Circle(F0_R_9, mode=Mode.SUBTRACT)
        with Locations((-44.0767258406, -13.292982243)):
            Circle(F0_R)
        with Locations((-44.0767258406, -13.292982243)):
            Circle(F0_R_10, mode=Mode.SUBTRACT)
    extrude(amount=F1_DEPTH)

    # F2
    f2_edges = [f1.edges().sort_by_distance(p)[0] for p in [
        (-21.764601, -6.35, 45.046158),
    ]]
    fillet(f2_edges, radius=F2_R)

    # F3: fillet of radius 5 on 1 edges, made by hand

    # F3_s1 → F3_t2 (revolve, cut)
    with BuildSketch(Plane.XY.offset(45.0461581349)):
        with BuildLine():
            ThreePointArc((-7.93886164, -1.35), (-6.3587432222, -0.3497311906), (-4.5216259151, 0))
            Line((-4.5216259151, 0), (-7.93886164, 0))
            Line((-7.93886164, 0), (-7.93886164, -1.35))
        make_face()
    revolve(axis=Axis((-14.8517312482, 0, 45.0461581349), (0, -1, 0)), mode=Mode.SUBTRACT)

    # F4
    f4_edges = [f1.edges().sort_by_distance(p)[0] for p in [
        (7.660379, -6.35, -45.537125),
    ]]
    fillet(f4_edges, radius=F4_R)

    # F5: fillet of radius 5 on 1 edges, made by hand

    # F5_s1 → F5_t2 (revolve, cut)
    with BuildSketch(Plane.XY.offset(-45.5371253192)):
        with BuildLine():
            ThreePointArc((21.0611489815, -1.35), (22.6412673994, -0.3497311906), (24.4783847065, 0))
            Line((24.4783847065, 0), (21.0611489815, 0))
            Line((21.0611489815, 0), (21.0611489815, -1.35))
        make_face()
    revolve(axis=Axis((14.3607640639, 0, -45.5371253192), (0, -1, 0)), mode=Mode.SUBTRACT)

    # F6
    f6_edges = [f1.edges().sort_by_distance(p)[0] for p in [
        (-50.933283, -6.35, -13.292982),
    ]]
    fillet(f6_edges, radius=F6_R)

    # F7: fillet of radius 5 on 1 edges, made by hand

    # F7_s1 → F7_t2 (revolve, cut)
    with BuildSketch(Plane.XY.offset(-13.292982243)):
        with BuildLine():
            ThreePointArc((-37.220168322, -1.35), (-35.6400499041, -0.3497311906), (-33.802932597, 0))
            Line((-33.802932597, 0), (-37.220168322, 0))
            Line((-37.220168322, 0), (-37.220168322, -1.35))
        make_face()
    revolve(axis=Axis((-44.0767258406, 0, -13.292982243), (0, -1, 0)), mode=Mode.SUBTRACT)

    # F8
    f8_edges = [f1.edges().sort_by_distance(p)[0] for p in [
        (36.486925, -6.35, 13.378832),
    ]]
    fillet(f8_edges, radius=F8_R)

    # F9: fillet of radius 5 on 1 edges, made by hand

    # F9_s1 → F9_t2 (revolve, cut)
    with BuildSketch(Plane.XY.offset(13.3788315579)):
        with BuildLine():
            ThreePointArc((49.6776614793, -1.35), (51.2577798972, -0.3497311906), (53.0948972043, 0))
            Line((53.0948972043, 0), (49.6776614793, 0))
            Line((49.6776614793, 0), (49.6776614793, -1.35))
        make_face()
    revolve(axis=Axis((43.082293123, 0, 13.3788315579), (0, -1, 0)), mode=Mode.SUBTRACT)


solid = f1.part
